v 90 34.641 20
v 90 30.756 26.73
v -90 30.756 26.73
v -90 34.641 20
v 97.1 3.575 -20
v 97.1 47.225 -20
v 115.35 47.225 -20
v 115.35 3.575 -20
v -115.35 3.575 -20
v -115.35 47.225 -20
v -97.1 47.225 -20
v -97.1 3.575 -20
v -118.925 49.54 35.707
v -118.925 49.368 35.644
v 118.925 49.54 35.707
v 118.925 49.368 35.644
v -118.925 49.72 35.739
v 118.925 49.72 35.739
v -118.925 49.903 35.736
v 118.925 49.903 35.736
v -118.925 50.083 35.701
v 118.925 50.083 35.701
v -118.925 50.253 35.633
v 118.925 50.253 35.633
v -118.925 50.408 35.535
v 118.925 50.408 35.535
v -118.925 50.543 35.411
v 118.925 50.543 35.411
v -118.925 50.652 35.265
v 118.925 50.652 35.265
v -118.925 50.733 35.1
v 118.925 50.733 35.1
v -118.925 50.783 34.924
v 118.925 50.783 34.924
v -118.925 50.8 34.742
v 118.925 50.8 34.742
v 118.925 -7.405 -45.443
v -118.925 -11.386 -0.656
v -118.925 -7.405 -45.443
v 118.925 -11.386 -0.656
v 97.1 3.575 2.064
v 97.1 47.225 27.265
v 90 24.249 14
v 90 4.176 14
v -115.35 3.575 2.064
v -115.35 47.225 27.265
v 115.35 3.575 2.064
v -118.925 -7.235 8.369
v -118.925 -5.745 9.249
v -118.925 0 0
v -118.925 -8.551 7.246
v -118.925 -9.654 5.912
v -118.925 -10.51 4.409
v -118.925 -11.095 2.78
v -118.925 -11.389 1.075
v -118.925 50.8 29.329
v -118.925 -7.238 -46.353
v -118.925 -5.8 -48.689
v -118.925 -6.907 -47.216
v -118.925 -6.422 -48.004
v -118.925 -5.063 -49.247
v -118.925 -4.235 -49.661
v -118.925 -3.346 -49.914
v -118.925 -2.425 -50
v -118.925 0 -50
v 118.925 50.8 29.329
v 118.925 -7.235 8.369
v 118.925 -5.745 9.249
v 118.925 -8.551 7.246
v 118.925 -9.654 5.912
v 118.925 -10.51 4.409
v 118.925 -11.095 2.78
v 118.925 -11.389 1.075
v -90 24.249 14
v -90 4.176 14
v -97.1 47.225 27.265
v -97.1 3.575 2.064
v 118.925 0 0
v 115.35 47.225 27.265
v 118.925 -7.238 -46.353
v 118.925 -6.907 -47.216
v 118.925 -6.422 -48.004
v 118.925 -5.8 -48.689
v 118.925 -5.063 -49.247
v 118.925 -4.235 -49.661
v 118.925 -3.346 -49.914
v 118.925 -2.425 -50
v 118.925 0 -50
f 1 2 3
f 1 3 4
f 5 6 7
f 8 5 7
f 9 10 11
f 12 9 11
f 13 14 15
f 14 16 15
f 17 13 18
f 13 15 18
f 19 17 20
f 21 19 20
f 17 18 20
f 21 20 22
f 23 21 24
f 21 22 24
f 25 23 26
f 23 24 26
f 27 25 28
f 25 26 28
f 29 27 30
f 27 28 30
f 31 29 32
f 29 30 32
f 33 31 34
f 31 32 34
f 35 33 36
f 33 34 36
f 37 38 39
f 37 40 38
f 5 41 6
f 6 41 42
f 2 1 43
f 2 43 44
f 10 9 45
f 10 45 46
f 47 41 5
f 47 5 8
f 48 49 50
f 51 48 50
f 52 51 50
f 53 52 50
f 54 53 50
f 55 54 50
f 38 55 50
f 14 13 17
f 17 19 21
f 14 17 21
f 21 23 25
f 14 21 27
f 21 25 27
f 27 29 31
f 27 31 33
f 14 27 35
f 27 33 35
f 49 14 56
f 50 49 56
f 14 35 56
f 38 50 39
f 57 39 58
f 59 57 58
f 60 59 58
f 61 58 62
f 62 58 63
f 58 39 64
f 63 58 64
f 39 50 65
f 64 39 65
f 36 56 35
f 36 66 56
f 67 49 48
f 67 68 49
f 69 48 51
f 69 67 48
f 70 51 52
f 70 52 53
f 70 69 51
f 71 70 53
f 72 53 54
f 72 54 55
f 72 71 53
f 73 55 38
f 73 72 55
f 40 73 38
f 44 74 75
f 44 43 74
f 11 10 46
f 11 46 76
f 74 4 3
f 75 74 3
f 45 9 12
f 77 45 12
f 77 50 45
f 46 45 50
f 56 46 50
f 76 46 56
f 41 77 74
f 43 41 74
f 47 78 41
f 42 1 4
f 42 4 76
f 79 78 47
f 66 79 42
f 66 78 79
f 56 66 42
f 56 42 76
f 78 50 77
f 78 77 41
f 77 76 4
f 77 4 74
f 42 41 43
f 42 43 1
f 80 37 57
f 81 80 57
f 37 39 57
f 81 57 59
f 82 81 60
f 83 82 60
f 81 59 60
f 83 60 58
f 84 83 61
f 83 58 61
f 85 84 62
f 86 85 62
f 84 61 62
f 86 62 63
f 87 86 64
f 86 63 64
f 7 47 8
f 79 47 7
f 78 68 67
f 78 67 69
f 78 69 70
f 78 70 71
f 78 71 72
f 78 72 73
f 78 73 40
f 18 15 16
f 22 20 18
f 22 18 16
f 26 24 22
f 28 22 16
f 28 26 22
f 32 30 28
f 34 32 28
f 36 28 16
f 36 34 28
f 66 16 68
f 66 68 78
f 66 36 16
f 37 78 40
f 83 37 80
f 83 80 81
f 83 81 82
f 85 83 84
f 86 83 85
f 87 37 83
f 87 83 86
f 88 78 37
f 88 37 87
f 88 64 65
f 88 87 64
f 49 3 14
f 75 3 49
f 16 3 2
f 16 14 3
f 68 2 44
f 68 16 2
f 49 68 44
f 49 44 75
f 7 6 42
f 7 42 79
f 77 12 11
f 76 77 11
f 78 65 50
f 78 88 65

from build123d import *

# Parameters (mm, degrees)
BOSS_EXTRUDE2_DEPTH             = 118.925
BOSS_EXTRUDE1_REACH             = 140.65
SKETCH2_W                       = 18.25
SKETCH2_H                       = 43.65
BOSS_EXTRUDE1_DIRECTION_2_DEPTH = 20
CUT_EXTRUDE2_DEPTH              = 90
FILLET1_R                       = 10
FILLET2_R                       = 5
FILLET3_R                       = 1


with BuildPart() as part:
    # Sketch1 → Boss-Extrude2 (new, symmetric)
    with BuildSketch(Plane(origin=(0, 0, 0), x_dir=(0, 0, -1), z_dir=(1, 0, 0))):
        Polygon((0, 0), (-29.329393675, 50.8), (-36.329393675, 50.8), (-6.252899132, -12), (50, -7), (50, 0), align=None)
    extrude(amount=BOSS_EXTRUDE2_DEPTH, both=True)

    # Boss-Extrude1: up to this plane
    boss_extrude1_end = Plane(origin=(118.925, 0, 0), z_dir=(0, -0.5000000000000043, 0.8660254037844363))
    # Sketch2 → Boss-Extrude1 (add, up to the surface)
    with BuildSketch(Plane.XY, mode=Mode.PRIVATE) as boss_extrude1_sk1:
        with Locations((106.225, 25.4)):
            Rectangle(SKETCH2_W, SKETCH2_H)
    boss_extrude1_tool1 = split(extrude(boss_extrude1_sk1.sketch, amount=BOSS_EXTRUDE1_REACH, mode=Mode.PRIVATE), bisect_by=boss_extrude1_end, keep=Keep.BOTH, mode=Mode.PRIVATE)
    add(boss_extrude1_tool1.solids().sort_by_distance((106.225, 25.4, 0))[0])
    # Sketch2 → Boss-Extrude1 (add, up to the surface)
    with BuildSketch(Plane.XY, mode=Mode.PRIVATE) as boss_extrude1_sk2:
        with Locations((-106.225, 25.4)):
            Rectangle(SKETCH2_W, SKETCH2_H)
    boss_extrude1_tool2 = split(extrude(boss_extrude1_sk2.sketch, amount=BOSS_EXTRUDE1_REACH, mode=Mode.PRIVATE), bisect_by=boss_extrude1_end, keep=Keep.BOTH, mode=Mode.PRIVATE)
    add(boss_extrude1_tool2.solids().sort_by_distance((-106.225, 25.4, 0))[0])

    # Sketch2 → Boss-Extrude1 direction 2 (add)
    with BuildSketch(Plane.XY):
        with Locations((106.225, 25.4)):
            Rectangle(SKETCH2_W, SKETCH2_H)
        with Locations((-106.225, 25.4)):
            Rectangle(SKETCH2_W, SKETCH2_H)
    extrude(amount=-BOSS_EXTRUDE1_DIRECTION_2_DEPTH)

    # Sketch4 → Cut-Extrude2 (cut, symmetric)
    with BuildSketch(Plane(origin=(0, 0, 0), x_dir=(0, 0, -1), z_dir=(1, 0, 0))):
        Polygon((-26.729651832, 30.755649855), (-20, 34.641016151), (-14, 24.248711306), (-14, 4.176018579), align=None)
    extrude(amount=CUT_EXTRUDE2_DEPTH, both=True, mode=Mode.SUBTRACT)

    # Fillet1
    fillet1_edges = [part.edges().sort_by_distance(p)[0] for p in [
        (0, -12, 6.252899132),
    ]]
    fillet(fillet1_edges, radius=FILLET1_R)

    # Fillet2
    fillet2_edges = [part.edges().sort_by_distance(p)[0] for p in [
        (0, -7, -50),
    ]]
    fillet(fillet2_edges, radius=FILLET2_R)

    # Fillet3
    fillet3_edges = [part.edges().sort_by_distance(p)[0] for p in [
        (0, 50.8, 36.329393675),
    ]]
    fillet(fillet3_edges, radius=FILLET3_R)


solid = part.part
